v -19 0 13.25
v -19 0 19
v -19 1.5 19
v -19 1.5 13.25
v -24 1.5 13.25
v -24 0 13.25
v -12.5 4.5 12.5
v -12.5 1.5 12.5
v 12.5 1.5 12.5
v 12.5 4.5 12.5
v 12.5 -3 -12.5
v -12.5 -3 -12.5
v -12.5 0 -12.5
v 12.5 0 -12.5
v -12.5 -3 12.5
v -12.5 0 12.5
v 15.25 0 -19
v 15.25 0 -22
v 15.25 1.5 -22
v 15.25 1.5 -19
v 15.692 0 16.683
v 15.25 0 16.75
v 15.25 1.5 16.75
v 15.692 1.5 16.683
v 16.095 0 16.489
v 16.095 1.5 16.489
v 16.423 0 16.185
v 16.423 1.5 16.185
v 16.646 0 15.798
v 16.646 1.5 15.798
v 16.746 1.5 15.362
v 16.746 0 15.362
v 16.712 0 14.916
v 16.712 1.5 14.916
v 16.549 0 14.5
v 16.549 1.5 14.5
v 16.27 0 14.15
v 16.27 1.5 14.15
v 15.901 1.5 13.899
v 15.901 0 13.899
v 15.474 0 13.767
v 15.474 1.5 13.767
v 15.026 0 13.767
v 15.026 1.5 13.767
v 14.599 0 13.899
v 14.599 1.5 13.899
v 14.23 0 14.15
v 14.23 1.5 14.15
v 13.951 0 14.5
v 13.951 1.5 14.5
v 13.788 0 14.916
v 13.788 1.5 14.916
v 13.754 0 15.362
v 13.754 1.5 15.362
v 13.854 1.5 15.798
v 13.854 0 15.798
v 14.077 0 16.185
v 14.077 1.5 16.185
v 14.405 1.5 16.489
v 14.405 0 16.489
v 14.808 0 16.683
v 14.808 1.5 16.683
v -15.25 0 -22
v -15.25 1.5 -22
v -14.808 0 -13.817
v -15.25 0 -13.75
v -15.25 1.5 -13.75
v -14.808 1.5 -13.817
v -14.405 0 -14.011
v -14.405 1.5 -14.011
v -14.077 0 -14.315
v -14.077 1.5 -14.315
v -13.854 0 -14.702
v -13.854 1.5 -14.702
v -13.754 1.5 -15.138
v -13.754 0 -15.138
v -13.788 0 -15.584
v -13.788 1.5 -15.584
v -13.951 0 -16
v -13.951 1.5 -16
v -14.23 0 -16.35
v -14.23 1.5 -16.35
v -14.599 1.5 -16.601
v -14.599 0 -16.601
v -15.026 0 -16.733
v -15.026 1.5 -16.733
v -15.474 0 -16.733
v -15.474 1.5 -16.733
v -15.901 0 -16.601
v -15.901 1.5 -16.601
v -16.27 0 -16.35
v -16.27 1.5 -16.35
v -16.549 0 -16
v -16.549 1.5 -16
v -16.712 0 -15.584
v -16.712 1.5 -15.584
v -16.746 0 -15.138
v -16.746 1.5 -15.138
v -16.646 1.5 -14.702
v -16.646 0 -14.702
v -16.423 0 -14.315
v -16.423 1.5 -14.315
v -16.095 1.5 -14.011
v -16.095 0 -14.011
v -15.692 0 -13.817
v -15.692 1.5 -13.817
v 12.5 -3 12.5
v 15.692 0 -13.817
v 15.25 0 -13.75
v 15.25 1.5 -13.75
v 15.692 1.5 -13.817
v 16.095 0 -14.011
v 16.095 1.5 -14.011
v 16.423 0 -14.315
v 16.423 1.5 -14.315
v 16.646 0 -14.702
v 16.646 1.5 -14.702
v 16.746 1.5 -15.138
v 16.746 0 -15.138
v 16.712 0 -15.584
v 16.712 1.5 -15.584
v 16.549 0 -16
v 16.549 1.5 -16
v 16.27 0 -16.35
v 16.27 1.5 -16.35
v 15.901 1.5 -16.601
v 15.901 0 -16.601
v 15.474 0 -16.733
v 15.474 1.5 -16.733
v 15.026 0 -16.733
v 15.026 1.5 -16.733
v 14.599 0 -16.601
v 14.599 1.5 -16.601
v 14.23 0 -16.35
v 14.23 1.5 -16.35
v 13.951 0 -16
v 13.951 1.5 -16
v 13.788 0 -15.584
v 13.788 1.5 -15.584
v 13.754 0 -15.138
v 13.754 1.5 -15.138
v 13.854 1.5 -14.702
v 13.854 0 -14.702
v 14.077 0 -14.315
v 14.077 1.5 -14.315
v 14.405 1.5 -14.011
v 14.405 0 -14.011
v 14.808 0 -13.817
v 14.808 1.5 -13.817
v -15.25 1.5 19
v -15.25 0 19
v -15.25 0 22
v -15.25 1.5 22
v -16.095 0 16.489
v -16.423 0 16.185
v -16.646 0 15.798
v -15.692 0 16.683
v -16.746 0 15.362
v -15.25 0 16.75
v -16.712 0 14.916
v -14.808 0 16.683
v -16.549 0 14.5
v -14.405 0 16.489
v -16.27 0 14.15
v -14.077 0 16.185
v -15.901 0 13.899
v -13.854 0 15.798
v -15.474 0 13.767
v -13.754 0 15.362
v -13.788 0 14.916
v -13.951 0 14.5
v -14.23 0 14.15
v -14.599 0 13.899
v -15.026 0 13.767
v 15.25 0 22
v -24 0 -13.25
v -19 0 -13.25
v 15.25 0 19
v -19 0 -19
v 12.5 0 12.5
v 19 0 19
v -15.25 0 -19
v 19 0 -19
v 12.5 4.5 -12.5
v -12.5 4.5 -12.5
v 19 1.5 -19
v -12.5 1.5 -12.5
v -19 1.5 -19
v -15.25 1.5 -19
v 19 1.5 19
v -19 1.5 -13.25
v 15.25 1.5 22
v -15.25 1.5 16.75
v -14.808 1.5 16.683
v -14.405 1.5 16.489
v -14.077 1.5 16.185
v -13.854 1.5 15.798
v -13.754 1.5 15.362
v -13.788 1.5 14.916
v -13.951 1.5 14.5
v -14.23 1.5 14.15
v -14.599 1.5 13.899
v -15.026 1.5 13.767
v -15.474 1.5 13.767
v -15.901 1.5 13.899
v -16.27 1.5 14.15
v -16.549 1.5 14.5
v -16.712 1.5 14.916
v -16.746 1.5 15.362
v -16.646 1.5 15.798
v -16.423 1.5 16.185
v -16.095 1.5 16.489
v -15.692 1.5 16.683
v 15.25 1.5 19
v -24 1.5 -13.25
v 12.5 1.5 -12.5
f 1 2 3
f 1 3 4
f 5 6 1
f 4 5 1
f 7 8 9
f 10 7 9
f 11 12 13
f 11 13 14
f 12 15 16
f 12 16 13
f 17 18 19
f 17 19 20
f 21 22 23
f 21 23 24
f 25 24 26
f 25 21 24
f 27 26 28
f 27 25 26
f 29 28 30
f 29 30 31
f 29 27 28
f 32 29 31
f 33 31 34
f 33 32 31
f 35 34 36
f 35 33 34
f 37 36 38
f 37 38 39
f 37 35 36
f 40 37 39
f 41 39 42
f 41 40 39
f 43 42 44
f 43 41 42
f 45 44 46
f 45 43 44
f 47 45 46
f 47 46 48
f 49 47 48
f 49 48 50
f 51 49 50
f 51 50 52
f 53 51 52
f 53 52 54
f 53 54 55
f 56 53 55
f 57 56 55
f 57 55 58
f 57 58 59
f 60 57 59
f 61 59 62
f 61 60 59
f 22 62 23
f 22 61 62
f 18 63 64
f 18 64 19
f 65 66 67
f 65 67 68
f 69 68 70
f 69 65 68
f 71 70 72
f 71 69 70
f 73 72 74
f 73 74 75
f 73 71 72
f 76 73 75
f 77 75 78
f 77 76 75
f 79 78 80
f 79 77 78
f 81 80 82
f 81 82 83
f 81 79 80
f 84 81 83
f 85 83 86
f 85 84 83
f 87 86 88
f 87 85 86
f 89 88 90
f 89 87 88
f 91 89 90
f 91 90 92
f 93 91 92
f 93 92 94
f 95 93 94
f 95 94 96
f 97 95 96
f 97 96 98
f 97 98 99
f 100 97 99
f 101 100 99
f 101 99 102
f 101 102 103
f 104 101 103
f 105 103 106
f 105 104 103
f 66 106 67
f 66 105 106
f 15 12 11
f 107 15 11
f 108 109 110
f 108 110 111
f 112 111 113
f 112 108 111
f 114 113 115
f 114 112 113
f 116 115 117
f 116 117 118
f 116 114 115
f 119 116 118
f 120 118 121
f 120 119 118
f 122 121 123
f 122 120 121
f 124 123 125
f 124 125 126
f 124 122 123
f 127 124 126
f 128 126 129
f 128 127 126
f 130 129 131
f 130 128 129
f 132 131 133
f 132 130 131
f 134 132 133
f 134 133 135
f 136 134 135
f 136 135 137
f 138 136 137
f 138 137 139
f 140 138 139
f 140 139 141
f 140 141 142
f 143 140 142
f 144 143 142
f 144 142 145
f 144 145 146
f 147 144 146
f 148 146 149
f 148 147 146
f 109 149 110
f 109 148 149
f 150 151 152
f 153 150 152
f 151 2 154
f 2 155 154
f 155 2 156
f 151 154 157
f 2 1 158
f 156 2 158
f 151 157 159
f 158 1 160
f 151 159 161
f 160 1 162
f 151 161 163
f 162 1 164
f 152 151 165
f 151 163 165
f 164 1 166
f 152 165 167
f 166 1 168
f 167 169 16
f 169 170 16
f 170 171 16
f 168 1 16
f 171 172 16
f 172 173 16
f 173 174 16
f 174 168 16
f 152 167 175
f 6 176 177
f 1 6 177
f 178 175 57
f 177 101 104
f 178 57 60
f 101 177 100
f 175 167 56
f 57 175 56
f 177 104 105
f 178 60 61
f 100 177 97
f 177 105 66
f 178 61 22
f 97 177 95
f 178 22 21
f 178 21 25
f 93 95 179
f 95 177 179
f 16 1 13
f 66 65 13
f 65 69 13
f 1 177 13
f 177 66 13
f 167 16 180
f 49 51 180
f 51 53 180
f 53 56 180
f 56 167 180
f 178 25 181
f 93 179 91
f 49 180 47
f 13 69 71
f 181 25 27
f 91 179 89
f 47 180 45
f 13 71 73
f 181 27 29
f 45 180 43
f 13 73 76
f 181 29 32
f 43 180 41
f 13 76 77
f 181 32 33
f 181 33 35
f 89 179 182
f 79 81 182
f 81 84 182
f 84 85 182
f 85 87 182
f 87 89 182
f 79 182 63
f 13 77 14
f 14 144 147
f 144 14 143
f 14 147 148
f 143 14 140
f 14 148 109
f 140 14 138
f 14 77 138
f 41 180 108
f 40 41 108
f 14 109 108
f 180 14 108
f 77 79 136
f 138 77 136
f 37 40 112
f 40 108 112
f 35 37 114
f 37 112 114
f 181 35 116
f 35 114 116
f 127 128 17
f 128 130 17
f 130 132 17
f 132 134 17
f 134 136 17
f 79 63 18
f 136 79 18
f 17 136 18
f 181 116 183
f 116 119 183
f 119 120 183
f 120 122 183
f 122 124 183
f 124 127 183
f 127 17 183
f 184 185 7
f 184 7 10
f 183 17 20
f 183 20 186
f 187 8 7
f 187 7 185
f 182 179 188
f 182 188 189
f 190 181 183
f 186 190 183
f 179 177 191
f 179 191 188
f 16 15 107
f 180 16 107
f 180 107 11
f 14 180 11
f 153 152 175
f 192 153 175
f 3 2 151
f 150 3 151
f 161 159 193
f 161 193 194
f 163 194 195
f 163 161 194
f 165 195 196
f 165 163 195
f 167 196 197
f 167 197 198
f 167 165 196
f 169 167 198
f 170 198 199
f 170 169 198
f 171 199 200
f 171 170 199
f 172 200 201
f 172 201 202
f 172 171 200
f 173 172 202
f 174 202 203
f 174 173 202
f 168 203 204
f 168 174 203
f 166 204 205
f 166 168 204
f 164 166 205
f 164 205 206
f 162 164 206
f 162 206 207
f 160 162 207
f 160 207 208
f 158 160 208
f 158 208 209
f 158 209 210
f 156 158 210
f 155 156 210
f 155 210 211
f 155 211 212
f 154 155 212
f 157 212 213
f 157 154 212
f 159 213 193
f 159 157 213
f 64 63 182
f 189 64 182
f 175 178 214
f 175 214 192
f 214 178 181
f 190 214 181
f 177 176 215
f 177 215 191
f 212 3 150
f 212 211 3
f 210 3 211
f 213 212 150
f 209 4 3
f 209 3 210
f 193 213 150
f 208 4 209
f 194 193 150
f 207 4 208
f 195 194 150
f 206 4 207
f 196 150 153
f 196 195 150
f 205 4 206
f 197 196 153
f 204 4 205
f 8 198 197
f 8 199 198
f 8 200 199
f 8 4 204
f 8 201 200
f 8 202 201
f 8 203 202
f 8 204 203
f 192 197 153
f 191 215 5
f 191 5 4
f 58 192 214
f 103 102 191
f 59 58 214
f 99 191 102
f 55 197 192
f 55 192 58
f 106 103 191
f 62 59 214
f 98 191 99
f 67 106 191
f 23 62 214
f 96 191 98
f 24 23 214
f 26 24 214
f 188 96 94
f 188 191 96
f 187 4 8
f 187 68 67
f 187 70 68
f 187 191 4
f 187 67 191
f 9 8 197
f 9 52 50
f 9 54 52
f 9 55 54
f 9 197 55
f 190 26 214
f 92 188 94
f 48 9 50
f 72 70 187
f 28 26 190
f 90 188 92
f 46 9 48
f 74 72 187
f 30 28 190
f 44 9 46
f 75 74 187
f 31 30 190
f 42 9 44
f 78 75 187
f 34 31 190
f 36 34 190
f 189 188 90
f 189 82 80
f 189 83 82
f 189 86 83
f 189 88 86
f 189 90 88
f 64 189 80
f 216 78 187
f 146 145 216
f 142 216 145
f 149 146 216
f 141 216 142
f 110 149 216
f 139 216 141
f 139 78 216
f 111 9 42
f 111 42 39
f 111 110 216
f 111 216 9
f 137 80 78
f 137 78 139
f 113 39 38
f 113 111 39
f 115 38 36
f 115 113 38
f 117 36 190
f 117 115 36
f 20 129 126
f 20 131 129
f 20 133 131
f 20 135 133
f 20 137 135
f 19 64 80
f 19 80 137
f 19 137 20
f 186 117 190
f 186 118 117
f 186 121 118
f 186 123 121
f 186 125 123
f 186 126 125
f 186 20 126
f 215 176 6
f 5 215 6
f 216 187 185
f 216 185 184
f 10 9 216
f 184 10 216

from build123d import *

# Parameters (mm, degrees)
SKETCH_1_W           = 38
SKETCH_1_H           = 38
SKETCH_1_R           = 1.5
EXTRUDE_1_DEPTH      = 1.5
SKETCH_2_W           = 5
SKETCH_2_H           = 26.5
SKETCH_2_W_2         = 30.5
SKETCH_2_H_2         = 3
EXTRUDE_2_DEPTH      = 1.5
EXTRUDE_3_DEPTH      = 3
EXTRUDE_3_DEPTH_BACK = 4.5
SKETCH_3_W           = 25
SKETCH_3_H           = 25


with BuildPart() as part:
    # 草图1 → 凸台-拉伸1 (new body)
    with BuildSketch(Plane(origin=(0, 0, 0), x_dir=(1, 0, 0), z_dir=(0, 1, 0))):
        Rectangle(SKETCH_1_W, SKETCH_1_H)
        with Locations(Location((-15.25, 15.25, 0), (0, 0, 270))):
            Circle(SKETCH_1_R, mode=Mode.SUBTRACT)
        with Locations(Location((15.25, 15.25, 0), (0, 0, 270))):
            Circle(SKETCH_1_R, mode=Mode.SUBTRACT)
        with Locations(Location((15.25, -15.25, 0), (0, 0, 270))):
            Circle(SKETCH_1_R, mode=Mode.SUBTRACT)
        with Locations(Location((-15.25, -15.25, 0), (0, 0, 270))):
            Circle(SKETCH_1_R, mode=Mode.SUBTRACT)
    extrude(amount=EXTRUDE_1_DEPTH)

    # 草图2 → 凸台-拉伸2 (add)
    with BuildSketch(Plane.XZ):
        with Locations((-21.5, 0)):
            Rectangle(SKETCH_2_W, SKETCH_2_H)
        with Locations((0, -20.5)):
            Rectangle(SKETCH_2_W_2, SKETCH_2_H_2)
        with Locations((0, 20.5)):
            Rectangle(SKETCH_2_W_2, SKETCH_2_H_2)
    extrude(amount=-EXTRUDE_2_DEPTH)

    # 草图3 → 凸台-拉伸3 (add, two sides: drawn at the far end of the back side and taken through both)
    with BuildSketch(Plane(origin=(0, 1.5, 0), x_dir=(1, 0, 0), z_dir=(0, 1, 0)).offset(-EXTRUDE_3_DEPTH_BACK)):
        Rectangle(SKETCH_3_W, SKETCH_3_H)
    extrude(amount=EXTRUDE_3_DEPTH + EXTRUDE_3_DEPTH_BACK)


solid = part.part
